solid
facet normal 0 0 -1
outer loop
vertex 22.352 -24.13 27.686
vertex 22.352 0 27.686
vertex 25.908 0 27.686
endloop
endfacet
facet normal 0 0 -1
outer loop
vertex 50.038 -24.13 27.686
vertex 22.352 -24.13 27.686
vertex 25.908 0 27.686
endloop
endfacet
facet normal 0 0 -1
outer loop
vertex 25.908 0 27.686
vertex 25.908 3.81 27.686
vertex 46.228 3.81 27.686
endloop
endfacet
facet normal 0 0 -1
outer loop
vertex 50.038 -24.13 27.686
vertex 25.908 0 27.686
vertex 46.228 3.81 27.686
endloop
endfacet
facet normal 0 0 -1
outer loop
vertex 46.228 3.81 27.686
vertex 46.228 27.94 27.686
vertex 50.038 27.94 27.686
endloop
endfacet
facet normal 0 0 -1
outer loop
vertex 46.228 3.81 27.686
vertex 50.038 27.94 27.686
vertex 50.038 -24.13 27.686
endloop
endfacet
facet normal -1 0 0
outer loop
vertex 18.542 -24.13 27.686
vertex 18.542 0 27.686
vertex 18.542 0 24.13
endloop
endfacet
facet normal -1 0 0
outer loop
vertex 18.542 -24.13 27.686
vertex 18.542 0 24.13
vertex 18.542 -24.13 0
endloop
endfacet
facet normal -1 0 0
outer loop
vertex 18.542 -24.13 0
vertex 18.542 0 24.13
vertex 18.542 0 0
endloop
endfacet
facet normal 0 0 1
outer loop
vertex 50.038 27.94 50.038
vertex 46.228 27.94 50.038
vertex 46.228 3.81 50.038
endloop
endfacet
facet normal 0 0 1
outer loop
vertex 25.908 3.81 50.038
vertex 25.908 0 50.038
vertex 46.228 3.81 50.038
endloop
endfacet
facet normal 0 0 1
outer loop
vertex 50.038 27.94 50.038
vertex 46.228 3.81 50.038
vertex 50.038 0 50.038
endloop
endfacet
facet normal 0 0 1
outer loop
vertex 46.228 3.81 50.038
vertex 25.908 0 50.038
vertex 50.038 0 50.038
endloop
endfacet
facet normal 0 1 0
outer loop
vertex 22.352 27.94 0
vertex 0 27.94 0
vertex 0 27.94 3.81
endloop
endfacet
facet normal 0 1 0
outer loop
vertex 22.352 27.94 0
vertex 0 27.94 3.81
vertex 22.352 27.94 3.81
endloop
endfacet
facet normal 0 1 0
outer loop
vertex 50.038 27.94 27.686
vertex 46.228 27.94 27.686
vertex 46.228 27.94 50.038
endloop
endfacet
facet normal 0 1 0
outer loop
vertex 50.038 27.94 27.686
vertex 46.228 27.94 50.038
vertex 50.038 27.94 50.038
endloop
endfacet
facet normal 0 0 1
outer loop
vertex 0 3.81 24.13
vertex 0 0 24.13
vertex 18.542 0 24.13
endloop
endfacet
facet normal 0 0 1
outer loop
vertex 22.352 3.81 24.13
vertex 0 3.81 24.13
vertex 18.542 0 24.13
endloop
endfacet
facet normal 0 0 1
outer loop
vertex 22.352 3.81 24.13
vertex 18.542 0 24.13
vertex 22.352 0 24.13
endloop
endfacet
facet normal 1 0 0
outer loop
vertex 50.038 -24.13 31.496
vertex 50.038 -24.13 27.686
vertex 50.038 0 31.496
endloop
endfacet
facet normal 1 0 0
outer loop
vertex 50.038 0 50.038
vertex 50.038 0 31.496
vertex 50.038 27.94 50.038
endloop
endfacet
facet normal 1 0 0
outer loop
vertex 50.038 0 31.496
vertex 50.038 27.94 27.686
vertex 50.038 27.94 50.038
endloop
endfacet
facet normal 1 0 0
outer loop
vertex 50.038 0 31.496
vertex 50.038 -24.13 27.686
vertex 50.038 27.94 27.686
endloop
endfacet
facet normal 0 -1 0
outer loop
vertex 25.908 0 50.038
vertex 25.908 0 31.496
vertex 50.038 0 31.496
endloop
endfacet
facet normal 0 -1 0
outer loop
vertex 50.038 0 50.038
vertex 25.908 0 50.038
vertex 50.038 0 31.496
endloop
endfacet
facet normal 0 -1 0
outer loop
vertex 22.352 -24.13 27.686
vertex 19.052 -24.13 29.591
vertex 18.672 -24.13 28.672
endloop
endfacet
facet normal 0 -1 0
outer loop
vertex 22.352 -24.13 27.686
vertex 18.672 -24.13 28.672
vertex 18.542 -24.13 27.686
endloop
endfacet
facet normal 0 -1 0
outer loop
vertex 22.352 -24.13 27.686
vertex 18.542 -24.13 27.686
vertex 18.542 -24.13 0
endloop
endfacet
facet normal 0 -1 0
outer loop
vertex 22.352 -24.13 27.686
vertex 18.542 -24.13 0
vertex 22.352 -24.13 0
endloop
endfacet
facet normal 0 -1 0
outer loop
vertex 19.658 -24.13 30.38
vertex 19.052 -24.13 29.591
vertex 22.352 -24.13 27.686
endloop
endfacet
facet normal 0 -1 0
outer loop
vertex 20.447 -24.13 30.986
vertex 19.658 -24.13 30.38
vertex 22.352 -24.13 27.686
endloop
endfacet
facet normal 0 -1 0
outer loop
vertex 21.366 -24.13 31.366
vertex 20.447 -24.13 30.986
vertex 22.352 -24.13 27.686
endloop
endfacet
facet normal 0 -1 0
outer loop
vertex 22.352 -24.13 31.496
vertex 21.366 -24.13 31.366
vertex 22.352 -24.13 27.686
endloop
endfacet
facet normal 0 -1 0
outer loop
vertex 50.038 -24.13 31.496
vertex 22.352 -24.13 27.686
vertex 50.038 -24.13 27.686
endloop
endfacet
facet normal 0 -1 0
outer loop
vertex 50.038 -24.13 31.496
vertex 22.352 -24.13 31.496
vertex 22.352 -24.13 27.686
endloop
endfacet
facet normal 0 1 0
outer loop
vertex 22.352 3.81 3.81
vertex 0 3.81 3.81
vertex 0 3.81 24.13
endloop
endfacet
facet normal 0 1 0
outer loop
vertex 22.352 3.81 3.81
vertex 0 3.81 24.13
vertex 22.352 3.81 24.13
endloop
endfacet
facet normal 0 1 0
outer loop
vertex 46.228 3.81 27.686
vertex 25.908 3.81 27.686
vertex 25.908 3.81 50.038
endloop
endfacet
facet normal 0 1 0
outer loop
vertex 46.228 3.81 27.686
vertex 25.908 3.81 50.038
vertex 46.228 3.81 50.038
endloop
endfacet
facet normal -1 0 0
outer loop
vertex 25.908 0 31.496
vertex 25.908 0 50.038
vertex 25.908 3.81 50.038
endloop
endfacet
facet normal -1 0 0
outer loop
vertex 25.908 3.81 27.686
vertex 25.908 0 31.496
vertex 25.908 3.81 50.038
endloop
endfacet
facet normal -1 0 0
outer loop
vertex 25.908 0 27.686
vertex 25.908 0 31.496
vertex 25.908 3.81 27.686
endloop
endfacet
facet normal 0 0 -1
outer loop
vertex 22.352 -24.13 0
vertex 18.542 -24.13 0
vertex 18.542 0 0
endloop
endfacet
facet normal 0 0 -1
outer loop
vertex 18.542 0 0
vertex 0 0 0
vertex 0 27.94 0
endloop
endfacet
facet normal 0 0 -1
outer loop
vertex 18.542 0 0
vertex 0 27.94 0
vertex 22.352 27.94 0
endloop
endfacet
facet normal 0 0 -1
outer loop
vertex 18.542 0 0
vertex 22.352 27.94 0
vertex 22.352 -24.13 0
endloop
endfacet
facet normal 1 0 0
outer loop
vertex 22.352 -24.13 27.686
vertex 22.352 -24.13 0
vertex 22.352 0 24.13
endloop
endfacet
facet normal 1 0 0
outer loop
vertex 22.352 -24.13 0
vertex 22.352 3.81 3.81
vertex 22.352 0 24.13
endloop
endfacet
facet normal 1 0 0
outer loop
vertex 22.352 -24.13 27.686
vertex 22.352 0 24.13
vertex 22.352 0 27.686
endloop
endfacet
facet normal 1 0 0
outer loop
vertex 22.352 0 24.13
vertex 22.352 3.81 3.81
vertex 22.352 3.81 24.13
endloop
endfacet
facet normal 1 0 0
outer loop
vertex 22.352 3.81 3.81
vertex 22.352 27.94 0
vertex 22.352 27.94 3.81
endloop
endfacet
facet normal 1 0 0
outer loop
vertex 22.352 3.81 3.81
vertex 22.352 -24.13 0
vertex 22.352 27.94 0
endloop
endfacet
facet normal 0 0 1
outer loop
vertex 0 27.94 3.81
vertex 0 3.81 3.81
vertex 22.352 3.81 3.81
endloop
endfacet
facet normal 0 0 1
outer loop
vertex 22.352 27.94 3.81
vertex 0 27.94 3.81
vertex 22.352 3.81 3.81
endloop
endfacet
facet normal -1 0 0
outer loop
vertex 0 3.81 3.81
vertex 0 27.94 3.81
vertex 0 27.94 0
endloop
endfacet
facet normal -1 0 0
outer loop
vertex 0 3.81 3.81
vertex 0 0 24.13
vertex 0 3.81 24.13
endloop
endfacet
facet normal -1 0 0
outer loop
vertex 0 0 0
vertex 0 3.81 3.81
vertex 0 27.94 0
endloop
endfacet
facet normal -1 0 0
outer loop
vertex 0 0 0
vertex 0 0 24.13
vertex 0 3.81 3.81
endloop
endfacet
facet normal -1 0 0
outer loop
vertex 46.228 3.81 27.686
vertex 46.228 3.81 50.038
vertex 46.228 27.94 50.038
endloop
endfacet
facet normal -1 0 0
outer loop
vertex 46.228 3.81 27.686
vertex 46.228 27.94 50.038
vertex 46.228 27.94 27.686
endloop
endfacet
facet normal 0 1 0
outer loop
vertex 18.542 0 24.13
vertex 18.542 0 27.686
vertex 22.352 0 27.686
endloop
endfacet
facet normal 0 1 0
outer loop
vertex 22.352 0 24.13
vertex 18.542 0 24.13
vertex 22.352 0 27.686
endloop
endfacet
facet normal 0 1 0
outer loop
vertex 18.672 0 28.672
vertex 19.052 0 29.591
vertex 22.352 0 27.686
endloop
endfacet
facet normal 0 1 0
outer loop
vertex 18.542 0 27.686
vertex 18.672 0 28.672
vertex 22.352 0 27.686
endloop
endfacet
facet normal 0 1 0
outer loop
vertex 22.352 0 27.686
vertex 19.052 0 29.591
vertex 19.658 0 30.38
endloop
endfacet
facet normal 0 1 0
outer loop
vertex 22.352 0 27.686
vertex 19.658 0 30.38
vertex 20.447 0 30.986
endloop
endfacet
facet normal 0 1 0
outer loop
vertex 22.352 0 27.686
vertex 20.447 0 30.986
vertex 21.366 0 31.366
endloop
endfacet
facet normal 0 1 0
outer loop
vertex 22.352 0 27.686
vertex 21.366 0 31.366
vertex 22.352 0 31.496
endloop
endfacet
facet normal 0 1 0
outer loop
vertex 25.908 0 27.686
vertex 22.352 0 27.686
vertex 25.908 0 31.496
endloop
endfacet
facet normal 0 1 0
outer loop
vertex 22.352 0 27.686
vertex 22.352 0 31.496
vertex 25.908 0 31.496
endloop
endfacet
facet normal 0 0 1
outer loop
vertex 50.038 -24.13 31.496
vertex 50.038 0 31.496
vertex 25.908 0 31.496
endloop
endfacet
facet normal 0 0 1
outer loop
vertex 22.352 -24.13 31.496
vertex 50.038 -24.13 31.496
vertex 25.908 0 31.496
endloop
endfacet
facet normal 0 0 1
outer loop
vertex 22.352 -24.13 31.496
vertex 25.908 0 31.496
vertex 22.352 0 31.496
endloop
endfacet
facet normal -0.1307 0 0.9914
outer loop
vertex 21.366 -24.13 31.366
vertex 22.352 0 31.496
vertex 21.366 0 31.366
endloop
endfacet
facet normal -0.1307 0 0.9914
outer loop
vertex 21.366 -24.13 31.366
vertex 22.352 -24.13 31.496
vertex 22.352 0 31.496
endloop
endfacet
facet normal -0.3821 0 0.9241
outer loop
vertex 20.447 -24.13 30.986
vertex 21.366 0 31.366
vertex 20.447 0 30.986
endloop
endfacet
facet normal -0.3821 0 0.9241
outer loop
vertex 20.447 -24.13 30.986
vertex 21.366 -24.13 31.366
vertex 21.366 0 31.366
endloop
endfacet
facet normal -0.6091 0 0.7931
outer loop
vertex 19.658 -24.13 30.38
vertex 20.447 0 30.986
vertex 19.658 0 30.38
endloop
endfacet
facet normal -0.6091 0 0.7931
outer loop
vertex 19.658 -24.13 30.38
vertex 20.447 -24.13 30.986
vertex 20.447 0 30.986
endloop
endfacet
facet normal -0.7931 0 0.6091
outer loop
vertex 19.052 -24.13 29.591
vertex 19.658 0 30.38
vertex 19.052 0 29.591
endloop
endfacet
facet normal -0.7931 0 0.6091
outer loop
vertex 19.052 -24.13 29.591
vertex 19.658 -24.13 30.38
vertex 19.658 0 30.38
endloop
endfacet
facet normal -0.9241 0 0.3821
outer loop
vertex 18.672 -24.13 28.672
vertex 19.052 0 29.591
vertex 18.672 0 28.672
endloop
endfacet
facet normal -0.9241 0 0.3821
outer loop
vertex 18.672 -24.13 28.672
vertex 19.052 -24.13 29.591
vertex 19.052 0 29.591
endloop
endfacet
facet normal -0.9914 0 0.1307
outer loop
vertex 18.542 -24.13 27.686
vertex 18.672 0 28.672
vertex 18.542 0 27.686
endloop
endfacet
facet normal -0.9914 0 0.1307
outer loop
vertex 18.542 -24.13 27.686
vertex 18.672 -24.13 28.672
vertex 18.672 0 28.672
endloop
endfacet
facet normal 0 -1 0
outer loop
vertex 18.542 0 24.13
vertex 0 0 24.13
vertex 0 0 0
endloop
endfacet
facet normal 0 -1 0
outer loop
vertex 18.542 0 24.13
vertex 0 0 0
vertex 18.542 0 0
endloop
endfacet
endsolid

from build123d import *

# Parameters (mm, degrees)
SKETCH1_W             = 24.13
SKETCH1_H             = 22.352
BOSS_EXTRUDE1_DEPTH   = 3.81
SKETCH1_W_2           = 22.352
SKETCH1_H_2           = 24.13
BOSS_EXTRUDE1_2_DEPTH = 3.81
SKETCH2_W             = 22.352
SKETCH2_H             = 3.81
SKETCH2_W_2           = 3.81
SKETCH2_H_2           = 22.352
BOSS_EXTRUDE2_DEPTH   = 24.13
BOSS_EXTRUDE3_DEPTH   = 24.13
FILLET1_R             = 3.81


with BuildPart() as part:
    # Sketch1 → Boss-Extrude1 (new body)
    with BuildSketch(Plane(origin=(0, 0, 0), x_dir=(1, 0, 0), z_dir=(0, 1, 0))):
        with Locations((37.973, -38.862)):
            Rectangle(SKETCH1_W, SKETCH1_H)
    extrude(amount=BOSS_EXTRUDE1_DEPTH)



with BuildPart() as body_2:
    # Sketch1 → Boss-Extrude1 2 (new body)
    with BuildSketch(Plane(origin=(0, 0, 0), x_dir=(1, 0, 0), z_dir=(0, 1, 0))):
        with Locations((11.176, -12.065)):
            Rectangle(SKETCH1_W_2, SKETCH1_H_2)
    extrude(amount=BOSS_EXTRUDE1_2_DEPTH)


with BuildPart() as part_1:
    add(part.part)

    add(body_2.part)  # Boss-Extrude2 merges body 2
    # Sketch2 → Boss-Extrude2 (add)
    with BuildSketch(Plane(origin=(0, 3.81, 0), x_dir=(1, 0, 0), z_dir=(0, 1, 0))):
        with Locations((11.176, -1.905)):
            Rectangle(SKETCH2_W, SKETCH2_H)
        with Locations((48.133, -38.862)):
            Rectangle(SKETCH2_W_2, SKETCH2_H_2)
    extrude(amount=BOSS_EXTRUDE2_DEPTH)

    # Sketch3 → Boss-Extrude3 (add)
    with BuildSketch(Plane.XZ):
        Polygon((22.352, 27.686), (50.038, 27.686), (50.038, 31.496), (18.542, 31.496), (18.542, 0), (22.352, 0), align=None)
    extrude(amount=BOSS_EXTRUDE3_DEPTH)

    # Fillet1
    fillet1_edges = [part_1.edges().sort_by_distance(p)[0] for p in [
        (18.542, -12.065, 31.496),
    ]]
    fillet(fillet1_edges, radius=FILLET1_R)


solid = part_1.part
